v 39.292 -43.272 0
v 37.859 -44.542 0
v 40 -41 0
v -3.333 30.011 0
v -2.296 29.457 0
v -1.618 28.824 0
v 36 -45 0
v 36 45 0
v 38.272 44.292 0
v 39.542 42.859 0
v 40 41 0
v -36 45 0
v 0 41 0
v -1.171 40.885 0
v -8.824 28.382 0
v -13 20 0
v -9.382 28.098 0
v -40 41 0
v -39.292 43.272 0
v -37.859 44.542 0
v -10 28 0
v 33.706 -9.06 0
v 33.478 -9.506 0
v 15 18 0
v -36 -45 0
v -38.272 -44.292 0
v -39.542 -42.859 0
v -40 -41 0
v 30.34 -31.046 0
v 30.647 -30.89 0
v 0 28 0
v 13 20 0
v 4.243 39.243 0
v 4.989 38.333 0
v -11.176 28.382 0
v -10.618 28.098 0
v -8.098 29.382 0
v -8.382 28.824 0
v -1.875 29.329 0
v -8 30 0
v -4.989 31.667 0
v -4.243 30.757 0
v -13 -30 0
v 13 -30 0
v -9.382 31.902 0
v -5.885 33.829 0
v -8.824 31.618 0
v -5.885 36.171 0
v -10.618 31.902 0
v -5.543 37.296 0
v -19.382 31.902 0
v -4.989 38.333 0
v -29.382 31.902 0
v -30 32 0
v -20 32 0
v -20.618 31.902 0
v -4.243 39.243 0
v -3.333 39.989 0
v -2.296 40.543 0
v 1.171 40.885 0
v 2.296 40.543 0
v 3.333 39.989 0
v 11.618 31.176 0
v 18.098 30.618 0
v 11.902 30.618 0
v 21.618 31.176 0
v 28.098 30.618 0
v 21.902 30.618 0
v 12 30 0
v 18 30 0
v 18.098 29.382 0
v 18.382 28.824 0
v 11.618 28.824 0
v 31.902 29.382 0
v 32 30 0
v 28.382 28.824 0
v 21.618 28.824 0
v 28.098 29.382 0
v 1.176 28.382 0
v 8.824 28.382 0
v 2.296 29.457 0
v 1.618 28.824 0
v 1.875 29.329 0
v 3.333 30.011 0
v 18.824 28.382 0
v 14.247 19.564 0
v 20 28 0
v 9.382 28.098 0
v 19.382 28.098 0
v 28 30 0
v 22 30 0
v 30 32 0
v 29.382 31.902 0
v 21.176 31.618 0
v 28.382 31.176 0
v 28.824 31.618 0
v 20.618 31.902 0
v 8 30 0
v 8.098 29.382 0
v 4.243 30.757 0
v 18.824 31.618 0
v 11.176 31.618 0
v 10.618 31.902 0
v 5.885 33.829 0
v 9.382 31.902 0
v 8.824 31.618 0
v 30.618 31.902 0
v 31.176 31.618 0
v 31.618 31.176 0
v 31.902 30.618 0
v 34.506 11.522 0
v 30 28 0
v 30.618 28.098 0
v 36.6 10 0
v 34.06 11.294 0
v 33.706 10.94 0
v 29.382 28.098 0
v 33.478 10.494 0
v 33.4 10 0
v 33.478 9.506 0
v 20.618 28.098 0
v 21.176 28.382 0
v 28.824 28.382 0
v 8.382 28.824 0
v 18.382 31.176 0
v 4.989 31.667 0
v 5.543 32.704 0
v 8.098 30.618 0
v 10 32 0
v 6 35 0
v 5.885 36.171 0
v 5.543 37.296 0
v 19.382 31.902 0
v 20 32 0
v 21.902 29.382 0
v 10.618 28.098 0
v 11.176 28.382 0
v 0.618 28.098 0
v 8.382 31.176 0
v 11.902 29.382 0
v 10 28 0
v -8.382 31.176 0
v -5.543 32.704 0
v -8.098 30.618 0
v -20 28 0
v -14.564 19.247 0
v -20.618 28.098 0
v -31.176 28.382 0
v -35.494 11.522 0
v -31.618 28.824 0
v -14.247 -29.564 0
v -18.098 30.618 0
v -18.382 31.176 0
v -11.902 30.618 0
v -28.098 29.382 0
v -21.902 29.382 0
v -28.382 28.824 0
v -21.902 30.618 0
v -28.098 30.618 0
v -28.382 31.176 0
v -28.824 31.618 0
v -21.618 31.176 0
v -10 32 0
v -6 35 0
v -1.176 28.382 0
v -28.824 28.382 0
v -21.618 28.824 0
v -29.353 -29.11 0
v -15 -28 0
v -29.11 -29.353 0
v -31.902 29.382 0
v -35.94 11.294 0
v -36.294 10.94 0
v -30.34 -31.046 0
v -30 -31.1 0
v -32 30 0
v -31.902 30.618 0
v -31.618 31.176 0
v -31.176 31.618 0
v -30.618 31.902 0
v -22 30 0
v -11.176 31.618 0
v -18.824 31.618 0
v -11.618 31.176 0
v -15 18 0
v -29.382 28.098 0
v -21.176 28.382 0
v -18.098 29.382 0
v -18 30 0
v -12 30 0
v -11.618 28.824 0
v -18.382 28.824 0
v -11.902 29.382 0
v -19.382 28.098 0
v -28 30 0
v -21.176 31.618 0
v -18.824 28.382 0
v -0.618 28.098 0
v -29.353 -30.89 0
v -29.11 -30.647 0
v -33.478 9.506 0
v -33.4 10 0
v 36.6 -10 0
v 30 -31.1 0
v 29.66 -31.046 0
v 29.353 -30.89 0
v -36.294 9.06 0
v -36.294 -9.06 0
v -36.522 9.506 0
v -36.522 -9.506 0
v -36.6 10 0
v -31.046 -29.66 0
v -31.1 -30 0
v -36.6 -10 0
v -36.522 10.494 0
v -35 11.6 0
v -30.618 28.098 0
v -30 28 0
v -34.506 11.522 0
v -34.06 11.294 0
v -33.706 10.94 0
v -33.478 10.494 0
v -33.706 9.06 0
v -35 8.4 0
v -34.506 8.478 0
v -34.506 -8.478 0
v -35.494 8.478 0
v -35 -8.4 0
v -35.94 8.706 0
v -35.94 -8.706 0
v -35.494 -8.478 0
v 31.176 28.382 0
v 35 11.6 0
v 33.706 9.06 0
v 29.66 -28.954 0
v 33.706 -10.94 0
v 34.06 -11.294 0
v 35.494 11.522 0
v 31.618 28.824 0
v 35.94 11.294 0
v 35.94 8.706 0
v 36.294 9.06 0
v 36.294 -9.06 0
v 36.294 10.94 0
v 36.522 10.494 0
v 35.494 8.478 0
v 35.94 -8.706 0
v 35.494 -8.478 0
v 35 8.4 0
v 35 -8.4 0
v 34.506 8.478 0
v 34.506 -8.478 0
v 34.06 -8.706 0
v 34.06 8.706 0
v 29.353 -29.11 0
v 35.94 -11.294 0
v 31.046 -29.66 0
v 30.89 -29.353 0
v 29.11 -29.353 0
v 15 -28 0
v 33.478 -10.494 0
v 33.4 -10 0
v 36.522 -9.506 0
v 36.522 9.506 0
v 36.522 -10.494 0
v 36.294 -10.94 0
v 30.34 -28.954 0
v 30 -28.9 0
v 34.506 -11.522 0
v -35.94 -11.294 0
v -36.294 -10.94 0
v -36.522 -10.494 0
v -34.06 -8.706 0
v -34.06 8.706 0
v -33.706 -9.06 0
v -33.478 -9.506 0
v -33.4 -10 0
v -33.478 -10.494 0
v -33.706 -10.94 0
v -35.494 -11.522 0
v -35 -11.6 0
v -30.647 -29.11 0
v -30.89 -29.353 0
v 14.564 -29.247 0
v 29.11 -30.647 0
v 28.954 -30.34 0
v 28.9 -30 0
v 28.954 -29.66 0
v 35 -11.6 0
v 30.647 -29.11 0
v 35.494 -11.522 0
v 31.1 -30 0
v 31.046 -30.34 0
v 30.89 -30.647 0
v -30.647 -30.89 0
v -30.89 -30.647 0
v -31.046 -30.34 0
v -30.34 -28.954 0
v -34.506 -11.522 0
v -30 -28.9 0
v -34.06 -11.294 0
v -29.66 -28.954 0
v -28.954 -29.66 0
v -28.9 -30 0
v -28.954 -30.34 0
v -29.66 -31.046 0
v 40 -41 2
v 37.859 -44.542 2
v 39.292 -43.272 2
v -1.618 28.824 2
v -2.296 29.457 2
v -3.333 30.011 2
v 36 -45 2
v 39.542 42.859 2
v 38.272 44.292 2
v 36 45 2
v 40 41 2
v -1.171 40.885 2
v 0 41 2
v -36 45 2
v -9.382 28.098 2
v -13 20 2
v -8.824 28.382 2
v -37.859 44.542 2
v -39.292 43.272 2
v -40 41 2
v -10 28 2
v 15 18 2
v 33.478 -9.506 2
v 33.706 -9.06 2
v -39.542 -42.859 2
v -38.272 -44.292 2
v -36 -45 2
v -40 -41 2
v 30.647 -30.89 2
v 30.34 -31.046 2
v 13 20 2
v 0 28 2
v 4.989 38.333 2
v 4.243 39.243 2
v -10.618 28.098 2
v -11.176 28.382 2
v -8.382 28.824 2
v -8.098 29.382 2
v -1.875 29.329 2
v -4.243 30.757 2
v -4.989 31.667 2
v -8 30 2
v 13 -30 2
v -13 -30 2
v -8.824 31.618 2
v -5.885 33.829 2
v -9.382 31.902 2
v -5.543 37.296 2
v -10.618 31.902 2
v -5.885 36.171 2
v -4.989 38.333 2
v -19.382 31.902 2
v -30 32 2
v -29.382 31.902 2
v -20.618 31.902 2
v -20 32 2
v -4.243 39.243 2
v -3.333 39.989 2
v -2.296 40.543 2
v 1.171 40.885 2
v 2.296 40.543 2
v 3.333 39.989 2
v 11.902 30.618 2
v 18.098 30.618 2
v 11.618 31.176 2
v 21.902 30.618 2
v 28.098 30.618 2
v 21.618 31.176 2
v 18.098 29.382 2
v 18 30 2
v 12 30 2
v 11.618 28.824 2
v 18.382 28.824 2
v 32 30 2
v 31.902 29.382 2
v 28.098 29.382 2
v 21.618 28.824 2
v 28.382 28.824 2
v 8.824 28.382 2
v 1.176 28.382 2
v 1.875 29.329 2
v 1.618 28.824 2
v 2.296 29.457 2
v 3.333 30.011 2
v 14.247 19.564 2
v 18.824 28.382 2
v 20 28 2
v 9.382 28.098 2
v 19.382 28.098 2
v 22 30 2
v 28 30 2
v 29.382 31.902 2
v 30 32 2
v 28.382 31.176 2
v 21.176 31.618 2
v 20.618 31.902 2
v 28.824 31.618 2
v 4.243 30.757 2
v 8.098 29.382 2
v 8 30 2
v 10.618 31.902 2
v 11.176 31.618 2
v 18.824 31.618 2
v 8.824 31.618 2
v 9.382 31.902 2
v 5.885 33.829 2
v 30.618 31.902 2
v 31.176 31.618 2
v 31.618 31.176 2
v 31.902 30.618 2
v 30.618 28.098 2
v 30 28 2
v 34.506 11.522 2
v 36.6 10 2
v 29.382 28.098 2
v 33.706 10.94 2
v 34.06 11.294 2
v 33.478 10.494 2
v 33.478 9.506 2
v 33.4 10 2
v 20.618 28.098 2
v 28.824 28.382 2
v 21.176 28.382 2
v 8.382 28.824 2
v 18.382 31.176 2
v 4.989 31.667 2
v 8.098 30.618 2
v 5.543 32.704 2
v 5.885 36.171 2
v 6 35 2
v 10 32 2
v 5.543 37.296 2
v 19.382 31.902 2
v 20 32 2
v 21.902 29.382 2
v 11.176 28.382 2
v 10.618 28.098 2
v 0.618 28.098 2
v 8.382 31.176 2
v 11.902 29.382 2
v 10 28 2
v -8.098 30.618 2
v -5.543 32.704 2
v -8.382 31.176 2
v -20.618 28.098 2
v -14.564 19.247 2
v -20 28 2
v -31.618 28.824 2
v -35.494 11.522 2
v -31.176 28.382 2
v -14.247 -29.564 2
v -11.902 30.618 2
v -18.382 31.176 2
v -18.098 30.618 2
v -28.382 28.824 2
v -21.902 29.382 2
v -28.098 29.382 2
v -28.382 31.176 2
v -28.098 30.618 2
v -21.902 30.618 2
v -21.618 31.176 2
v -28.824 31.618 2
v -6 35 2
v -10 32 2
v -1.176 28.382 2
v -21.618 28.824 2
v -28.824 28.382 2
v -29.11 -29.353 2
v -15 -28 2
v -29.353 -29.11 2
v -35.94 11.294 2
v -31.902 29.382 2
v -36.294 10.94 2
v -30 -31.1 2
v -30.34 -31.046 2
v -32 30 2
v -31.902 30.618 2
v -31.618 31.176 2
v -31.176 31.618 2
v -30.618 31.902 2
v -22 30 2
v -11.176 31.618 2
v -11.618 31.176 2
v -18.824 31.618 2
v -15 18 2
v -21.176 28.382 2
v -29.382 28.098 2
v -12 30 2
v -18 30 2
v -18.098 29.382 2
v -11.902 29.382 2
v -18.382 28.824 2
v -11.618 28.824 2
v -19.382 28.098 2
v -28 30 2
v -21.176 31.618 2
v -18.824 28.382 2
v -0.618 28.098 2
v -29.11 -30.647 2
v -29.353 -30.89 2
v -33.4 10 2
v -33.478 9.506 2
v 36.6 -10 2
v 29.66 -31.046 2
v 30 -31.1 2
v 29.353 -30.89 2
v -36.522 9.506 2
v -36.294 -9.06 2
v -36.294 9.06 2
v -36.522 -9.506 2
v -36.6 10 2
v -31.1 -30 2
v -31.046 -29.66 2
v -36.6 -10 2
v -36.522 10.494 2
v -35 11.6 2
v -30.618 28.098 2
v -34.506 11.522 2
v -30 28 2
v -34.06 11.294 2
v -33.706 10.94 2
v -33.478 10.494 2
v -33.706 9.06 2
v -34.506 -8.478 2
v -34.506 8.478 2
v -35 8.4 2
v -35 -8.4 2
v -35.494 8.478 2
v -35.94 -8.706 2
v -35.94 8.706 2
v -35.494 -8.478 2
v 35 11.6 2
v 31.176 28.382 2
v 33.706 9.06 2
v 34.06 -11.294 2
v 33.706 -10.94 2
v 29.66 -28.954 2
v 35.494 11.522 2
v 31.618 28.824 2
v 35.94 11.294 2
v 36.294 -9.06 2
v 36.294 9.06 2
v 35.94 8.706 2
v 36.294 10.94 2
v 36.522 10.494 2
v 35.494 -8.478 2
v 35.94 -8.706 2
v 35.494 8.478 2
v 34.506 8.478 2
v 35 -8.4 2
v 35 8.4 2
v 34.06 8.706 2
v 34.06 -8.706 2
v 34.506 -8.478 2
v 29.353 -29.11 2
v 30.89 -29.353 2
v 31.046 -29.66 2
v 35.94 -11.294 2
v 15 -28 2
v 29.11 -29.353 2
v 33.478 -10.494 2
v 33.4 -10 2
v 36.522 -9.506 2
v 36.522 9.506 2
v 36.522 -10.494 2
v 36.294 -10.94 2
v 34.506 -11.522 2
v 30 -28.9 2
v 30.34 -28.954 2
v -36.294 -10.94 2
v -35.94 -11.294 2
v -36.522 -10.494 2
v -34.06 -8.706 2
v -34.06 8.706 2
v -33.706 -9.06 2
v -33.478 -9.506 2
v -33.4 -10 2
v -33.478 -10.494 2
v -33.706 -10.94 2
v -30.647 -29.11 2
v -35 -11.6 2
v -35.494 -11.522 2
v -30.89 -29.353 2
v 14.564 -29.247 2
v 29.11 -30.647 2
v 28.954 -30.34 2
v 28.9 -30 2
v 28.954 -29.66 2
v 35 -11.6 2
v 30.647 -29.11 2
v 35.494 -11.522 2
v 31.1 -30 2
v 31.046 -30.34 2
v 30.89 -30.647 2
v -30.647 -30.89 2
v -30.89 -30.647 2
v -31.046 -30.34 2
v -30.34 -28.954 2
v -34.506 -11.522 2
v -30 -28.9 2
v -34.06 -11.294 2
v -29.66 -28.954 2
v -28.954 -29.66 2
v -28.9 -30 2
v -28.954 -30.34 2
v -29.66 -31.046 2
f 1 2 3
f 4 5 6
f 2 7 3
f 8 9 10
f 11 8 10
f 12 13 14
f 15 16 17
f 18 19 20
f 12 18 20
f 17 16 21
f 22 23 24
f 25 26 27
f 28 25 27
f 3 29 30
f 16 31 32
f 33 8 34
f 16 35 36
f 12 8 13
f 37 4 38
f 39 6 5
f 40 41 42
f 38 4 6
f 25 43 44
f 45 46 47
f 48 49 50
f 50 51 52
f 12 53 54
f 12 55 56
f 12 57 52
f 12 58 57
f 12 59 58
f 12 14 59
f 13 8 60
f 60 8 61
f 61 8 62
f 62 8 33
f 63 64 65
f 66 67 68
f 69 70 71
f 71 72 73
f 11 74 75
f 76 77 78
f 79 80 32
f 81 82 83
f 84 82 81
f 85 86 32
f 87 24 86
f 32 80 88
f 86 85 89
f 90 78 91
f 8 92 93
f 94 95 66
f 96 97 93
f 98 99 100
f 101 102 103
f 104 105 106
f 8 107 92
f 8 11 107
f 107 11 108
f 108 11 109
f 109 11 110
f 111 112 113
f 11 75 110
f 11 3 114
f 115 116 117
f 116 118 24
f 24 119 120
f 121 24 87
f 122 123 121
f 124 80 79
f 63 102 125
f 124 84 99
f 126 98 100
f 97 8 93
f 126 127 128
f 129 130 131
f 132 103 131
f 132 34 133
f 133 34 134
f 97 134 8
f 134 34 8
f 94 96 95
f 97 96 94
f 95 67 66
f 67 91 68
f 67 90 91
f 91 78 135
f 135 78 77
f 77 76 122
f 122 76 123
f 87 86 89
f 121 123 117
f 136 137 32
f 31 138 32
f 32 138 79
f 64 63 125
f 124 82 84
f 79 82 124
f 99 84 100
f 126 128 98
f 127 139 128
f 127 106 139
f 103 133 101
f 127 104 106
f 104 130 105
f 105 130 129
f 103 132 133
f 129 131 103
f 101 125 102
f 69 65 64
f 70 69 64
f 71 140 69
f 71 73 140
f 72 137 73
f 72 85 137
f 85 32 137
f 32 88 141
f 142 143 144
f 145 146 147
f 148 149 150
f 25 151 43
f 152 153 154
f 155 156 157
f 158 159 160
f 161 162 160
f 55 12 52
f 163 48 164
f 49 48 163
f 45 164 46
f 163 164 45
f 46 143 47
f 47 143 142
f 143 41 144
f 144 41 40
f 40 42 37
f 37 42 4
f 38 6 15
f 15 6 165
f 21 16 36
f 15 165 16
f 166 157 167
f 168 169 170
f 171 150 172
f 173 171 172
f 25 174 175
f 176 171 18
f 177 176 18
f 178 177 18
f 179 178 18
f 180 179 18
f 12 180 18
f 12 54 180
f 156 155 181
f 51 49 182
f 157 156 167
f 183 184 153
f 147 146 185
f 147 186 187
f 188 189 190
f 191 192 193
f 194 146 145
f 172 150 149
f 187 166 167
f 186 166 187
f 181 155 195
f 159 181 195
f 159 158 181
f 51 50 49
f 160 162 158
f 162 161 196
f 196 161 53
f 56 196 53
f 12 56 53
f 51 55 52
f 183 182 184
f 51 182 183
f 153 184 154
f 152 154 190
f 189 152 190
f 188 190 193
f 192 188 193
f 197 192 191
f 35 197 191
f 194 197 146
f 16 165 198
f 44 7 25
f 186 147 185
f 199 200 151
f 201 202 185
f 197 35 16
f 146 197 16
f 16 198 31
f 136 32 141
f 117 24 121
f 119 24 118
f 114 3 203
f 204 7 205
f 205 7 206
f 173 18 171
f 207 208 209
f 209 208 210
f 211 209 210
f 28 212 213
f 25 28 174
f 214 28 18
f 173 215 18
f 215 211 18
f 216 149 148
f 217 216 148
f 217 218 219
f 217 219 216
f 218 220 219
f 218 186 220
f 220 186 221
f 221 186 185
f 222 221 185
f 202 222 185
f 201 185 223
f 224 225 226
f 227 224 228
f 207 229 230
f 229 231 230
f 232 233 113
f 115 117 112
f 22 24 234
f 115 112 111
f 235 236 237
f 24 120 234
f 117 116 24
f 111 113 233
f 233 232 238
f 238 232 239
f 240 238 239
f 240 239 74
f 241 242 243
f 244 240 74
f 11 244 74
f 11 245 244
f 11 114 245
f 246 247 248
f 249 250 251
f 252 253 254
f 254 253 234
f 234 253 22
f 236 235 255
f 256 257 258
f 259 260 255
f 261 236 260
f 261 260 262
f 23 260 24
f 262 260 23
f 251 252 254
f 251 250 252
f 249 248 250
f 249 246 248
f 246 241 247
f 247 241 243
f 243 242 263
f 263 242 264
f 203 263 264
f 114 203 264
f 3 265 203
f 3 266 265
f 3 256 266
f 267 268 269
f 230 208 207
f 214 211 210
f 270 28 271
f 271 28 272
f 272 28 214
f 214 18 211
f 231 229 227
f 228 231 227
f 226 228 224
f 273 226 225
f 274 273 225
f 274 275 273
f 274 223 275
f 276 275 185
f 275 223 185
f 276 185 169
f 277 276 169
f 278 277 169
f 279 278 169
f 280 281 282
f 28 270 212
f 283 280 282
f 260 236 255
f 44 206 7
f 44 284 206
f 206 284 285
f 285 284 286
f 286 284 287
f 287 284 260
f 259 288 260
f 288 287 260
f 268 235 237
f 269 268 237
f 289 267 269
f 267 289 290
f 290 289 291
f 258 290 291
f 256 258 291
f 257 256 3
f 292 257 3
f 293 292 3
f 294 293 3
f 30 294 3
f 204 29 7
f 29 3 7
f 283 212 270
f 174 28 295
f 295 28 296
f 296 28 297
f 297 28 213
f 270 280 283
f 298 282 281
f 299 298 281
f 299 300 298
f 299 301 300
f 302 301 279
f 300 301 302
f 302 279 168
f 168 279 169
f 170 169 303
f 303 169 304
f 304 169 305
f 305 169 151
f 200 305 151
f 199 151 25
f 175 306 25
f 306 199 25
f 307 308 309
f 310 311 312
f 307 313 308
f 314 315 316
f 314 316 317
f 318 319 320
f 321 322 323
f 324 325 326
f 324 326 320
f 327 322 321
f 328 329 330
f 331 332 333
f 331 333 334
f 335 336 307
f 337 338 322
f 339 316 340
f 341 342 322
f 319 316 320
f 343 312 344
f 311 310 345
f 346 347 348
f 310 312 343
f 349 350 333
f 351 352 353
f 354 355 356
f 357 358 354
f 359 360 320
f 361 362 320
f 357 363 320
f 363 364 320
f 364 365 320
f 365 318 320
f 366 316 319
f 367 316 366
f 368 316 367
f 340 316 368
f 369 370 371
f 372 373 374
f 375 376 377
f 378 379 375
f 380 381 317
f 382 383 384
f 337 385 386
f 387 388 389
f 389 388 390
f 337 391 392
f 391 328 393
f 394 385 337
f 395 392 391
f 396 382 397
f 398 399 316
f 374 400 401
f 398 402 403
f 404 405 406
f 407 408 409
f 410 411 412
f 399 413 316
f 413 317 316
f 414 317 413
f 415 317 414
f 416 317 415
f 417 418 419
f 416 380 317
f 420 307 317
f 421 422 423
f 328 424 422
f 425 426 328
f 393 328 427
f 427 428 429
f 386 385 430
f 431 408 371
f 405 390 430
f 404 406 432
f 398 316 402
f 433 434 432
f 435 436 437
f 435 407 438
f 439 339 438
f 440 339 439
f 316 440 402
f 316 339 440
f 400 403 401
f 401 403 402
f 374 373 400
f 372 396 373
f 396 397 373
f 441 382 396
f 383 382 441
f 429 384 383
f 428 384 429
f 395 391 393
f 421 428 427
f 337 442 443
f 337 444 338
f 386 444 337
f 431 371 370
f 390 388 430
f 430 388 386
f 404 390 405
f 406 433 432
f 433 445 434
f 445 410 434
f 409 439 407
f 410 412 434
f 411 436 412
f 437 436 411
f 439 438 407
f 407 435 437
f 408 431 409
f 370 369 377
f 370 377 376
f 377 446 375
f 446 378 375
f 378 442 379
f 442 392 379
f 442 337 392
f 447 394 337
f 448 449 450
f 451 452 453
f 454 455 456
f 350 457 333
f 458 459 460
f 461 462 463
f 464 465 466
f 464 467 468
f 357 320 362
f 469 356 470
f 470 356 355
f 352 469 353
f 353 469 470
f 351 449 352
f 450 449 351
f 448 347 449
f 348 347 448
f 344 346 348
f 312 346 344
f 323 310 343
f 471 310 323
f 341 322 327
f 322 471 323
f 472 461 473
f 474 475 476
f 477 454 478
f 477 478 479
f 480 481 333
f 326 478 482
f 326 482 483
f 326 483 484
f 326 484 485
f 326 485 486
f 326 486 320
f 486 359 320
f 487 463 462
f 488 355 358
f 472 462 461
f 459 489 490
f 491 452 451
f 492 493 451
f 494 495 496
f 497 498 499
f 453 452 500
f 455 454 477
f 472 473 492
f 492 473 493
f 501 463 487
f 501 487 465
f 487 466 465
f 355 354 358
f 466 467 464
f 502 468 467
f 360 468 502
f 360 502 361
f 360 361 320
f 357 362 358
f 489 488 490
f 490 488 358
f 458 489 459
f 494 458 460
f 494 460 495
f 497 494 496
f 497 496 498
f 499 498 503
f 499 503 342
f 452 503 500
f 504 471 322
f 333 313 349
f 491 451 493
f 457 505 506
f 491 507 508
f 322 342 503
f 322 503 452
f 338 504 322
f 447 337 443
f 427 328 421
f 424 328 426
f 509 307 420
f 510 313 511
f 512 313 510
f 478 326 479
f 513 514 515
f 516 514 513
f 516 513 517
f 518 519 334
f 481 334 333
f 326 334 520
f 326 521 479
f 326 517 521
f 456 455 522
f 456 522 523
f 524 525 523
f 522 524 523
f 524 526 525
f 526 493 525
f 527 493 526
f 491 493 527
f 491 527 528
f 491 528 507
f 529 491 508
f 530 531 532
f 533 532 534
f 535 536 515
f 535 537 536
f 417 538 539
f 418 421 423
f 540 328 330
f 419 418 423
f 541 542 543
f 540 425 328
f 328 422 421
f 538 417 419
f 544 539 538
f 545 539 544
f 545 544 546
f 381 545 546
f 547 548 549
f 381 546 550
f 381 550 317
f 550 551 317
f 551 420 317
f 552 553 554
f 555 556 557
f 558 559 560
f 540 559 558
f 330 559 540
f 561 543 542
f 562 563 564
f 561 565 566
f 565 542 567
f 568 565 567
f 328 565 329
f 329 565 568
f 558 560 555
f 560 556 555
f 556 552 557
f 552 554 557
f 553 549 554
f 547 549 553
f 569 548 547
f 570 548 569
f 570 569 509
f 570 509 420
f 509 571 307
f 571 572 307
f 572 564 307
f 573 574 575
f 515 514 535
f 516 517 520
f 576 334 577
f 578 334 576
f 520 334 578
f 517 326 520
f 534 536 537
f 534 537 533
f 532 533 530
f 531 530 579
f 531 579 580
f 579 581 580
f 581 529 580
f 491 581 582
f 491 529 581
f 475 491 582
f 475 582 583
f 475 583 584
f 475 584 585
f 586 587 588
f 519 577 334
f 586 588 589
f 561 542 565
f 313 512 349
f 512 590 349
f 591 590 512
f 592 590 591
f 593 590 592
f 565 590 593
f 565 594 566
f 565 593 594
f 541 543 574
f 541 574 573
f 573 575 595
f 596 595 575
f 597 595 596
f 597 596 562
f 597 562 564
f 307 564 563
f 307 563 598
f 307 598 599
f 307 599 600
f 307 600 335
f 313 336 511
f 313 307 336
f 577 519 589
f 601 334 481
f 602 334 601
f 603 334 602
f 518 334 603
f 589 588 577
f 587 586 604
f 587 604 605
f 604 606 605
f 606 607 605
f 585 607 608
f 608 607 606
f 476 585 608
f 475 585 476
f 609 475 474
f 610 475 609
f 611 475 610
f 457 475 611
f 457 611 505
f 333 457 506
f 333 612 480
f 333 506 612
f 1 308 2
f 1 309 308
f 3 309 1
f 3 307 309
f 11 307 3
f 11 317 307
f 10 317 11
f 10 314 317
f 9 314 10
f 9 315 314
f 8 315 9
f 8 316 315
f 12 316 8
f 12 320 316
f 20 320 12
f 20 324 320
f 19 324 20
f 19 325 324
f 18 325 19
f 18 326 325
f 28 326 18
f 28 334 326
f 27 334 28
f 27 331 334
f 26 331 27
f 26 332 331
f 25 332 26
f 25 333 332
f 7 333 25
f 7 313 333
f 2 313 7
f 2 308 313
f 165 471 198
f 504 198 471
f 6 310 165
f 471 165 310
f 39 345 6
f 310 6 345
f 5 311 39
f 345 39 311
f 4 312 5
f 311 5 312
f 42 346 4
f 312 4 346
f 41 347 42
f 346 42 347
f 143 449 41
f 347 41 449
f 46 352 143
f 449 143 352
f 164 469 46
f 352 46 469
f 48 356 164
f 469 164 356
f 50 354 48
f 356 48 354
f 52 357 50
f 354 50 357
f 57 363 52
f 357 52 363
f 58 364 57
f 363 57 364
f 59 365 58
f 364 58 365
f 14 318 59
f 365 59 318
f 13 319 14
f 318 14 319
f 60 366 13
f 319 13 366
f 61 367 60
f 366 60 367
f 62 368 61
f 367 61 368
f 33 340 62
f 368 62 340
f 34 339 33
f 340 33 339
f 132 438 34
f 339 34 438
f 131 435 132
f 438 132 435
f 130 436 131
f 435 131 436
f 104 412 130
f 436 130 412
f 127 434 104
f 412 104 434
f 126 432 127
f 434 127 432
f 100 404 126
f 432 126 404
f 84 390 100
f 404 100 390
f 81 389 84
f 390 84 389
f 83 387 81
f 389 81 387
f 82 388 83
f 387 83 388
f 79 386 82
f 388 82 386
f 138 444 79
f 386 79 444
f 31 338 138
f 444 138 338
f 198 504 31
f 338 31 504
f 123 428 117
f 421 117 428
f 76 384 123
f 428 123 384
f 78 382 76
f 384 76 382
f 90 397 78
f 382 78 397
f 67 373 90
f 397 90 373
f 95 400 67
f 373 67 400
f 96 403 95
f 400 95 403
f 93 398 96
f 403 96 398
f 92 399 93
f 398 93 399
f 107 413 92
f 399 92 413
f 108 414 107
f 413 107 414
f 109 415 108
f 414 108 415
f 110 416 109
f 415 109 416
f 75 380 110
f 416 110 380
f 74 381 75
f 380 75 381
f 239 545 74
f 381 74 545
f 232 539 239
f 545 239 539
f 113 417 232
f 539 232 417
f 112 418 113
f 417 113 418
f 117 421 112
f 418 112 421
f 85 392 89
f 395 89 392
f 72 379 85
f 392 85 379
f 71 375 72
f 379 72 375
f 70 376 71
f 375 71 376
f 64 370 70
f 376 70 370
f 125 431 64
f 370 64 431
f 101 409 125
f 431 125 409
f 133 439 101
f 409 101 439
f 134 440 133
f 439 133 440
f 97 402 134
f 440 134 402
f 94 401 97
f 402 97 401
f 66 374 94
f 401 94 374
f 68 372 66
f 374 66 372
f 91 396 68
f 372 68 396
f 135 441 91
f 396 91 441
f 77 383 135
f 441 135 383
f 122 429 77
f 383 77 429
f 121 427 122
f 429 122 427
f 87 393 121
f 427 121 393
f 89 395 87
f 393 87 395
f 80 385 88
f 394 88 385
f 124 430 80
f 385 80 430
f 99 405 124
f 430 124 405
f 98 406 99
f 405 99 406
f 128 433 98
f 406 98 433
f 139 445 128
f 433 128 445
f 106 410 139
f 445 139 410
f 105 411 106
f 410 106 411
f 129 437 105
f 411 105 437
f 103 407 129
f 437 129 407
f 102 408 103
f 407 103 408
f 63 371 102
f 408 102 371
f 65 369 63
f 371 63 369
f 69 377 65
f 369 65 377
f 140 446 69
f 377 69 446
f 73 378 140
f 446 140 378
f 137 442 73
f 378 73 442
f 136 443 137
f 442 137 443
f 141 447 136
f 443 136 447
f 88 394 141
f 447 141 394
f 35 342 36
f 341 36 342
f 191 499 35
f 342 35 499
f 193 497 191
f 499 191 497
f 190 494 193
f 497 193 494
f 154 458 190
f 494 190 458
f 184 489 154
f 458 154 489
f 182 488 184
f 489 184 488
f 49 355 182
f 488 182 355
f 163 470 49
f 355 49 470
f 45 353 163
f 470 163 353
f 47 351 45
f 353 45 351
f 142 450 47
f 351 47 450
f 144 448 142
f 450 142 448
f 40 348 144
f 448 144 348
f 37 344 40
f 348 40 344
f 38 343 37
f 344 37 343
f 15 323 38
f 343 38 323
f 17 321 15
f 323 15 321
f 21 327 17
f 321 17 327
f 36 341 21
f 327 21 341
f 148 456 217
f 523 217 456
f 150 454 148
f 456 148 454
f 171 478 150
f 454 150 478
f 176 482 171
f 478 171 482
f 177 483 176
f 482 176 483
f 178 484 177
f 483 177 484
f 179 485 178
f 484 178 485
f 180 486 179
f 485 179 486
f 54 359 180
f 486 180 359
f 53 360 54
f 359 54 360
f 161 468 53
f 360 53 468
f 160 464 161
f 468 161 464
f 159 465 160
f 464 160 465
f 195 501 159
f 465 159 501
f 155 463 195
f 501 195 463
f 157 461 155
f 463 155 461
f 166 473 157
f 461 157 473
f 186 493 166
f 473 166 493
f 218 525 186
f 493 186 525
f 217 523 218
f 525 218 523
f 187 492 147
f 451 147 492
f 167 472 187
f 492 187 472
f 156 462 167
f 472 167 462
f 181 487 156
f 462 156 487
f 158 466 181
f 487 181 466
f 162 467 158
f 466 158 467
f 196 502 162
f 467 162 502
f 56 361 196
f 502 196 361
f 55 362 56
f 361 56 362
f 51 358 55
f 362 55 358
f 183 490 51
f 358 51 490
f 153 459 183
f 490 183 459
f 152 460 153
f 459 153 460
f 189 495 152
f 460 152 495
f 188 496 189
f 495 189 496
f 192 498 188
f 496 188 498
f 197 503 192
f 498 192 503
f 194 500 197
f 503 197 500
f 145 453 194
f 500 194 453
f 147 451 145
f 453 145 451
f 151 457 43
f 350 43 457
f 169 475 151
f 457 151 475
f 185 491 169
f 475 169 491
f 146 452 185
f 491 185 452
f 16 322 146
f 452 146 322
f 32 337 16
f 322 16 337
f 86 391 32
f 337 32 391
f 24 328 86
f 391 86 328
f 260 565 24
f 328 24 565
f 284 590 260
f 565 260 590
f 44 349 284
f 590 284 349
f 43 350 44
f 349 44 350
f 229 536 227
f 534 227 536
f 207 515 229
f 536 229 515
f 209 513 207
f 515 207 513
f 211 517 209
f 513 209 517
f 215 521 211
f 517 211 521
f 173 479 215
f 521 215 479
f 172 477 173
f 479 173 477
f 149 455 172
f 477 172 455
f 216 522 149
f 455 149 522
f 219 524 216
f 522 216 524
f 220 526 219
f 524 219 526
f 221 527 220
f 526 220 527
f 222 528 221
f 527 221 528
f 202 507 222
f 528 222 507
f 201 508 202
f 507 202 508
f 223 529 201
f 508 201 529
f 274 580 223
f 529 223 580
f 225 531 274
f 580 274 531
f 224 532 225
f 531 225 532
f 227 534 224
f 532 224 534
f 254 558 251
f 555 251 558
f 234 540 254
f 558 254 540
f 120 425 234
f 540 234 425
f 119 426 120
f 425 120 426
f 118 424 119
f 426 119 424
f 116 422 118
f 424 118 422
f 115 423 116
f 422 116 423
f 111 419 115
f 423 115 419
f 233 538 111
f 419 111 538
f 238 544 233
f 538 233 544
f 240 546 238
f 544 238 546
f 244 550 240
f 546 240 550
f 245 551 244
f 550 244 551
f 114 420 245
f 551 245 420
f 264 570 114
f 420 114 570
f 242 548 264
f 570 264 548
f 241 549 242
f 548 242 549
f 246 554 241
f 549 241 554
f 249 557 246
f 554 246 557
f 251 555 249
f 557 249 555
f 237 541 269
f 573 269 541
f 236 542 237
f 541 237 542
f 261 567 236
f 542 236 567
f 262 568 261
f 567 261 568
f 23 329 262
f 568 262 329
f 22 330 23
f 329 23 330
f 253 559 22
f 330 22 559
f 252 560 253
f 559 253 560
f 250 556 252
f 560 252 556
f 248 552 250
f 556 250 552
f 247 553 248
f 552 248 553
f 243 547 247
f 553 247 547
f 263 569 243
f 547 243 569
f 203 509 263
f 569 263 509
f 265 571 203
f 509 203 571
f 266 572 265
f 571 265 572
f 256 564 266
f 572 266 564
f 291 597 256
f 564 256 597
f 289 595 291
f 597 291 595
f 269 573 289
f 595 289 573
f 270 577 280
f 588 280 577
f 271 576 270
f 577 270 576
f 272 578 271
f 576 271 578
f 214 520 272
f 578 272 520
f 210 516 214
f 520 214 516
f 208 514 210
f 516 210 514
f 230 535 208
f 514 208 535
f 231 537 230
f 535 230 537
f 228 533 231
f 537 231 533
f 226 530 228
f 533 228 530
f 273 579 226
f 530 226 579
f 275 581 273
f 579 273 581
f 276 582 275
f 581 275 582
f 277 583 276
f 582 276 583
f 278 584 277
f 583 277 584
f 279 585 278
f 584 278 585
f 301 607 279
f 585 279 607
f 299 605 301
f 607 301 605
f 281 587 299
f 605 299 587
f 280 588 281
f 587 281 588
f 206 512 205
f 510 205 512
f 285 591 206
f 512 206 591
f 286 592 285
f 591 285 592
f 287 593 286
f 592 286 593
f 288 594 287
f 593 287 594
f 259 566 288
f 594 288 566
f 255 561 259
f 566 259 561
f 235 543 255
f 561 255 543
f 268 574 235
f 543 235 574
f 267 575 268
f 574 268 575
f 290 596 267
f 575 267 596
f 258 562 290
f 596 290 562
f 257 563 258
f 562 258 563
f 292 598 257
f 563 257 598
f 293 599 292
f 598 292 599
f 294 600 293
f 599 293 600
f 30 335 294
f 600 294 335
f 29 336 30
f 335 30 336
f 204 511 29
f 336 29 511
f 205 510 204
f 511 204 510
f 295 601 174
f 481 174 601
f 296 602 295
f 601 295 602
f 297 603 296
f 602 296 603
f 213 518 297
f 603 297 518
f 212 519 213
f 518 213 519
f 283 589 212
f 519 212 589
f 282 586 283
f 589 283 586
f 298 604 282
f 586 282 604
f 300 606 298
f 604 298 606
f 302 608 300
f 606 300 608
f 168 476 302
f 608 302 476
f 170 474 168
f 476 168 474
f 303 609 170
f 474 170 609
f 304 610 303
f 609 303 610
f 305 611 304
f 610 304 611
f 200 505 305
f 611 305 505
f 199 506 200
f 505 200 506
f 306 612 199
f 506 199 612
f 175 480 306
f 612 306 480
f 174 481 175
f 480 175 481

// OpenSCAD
// =====================================================
// PLACA BASE DEL CHASIS — IITA WRO Bot v1
// Para corte láser en aluminio 2mm o impresión 3D
// =====================================================
// Dimensiones: 80×90mm
// Material: Aluminio 6061 T6 de 2mm (corte láser)
//           o PLA+ 3mm (impresión 3D)
// =====================================================

// === DIMENSIONES GENERALES ===
chasis_ancho = 80;        // mm
chasis_largo = 90;        // mm
chasis_espesor = 2;       // mm (aluminio) o 3mm (PLA)
chasis_radio = 4;         // mm, radio de esquinas

// === POSICIONES DE MONTAJE ===

// Motores Pololu N20 (brackets)
motor_y = 45;             // mm desde borde frontal
motor_x_offset = 35;     // mm desde centro (cada lado)
motor_mount_d = 3.2;     // mm (inserto M2)
motor_mount_sep = 20;    // mm entre agujeros del bracket

// PCB inferior (Teensy) — 4 standoffs
pcb_mount_d = 2.2;       // mm (tornillo M2)
pcb_mount_x = 30;        // mm desde centro
pcb_mount_y_front = 15;  // mm desde borde frontal
pcb_mount_y_back = 75;   // mm desde borde frontal

// Ball caster trasero
caster_y = 80;            // mm desde borde frontal
caster_d = 12;            // mm, agujero para ball caster

// Dynamixel brazo (lateral)
dxl_brazo_x = -chasis_ancho/2 + 5;  // borde izquierdo
dxl_brazo_y = 35;
dxl_mount_d = 2.7;       // mm (M2.5)
dxl_mount_sep = 18;      // mm

// Batería LiPo (ventana central para bajar CG)
batt_ancho = 30;          // mm
batt_largo = 50;          // mm
batt_y = 40;              // mm desde borde frontal

// Sensor array color (agujeros para sensores VEML6040)
sensor_count = 7;
sensor_spacing = 10;      // mm entre sensores
sensor_d = 4;             // mm, agujero para sensor
sensor_y = 75;            // mm desde borde frontal

// === MÓDULO PLACA BASE ===
module placa_base_2d() {
    // Versión 2D para exportar DXF (corte láser)
    difference() {
        // Contorno con esquinas redondeadas
        offset(r=chasis_radio) 
            offset(r=-chasis_radio)
                square([chasis_ancho, chasis_largo], center=true);
        
        // Agujeros montaje motores (izq y der)
        for (lado = [-1, 1])
            for (dy = [-motor_mount_sep/2, motor_mount_sep/2])
                translate([lado * motor_x_offset, motor_y - chasis_largo/2 + dy])
                    circle(d=motor_mount_d, $fn=20);
        
        // Agujeros montaje PCB (4 esquinas)
        for (dx = [-pcb_mount_x, pcb_mount_x])
            for (dy = [pcb_mount_y_front, pcb_mount_y_back])
                translate([dx, dy - chasis_largo/2])
                    circle(d=pcb_mount_d, $fn=20);
        
        // Agujero ball caster
        translate([0, caster_y - chasis_largo/2])
            circle(d=caster_d, $fn=32);
        
        // Ventana batería (reduce peso + acceso batería)
        translate([-batt_ancho/2, batt_y - chasis_largo/2 - batt_largo/2])
            offset(r=2) offset(r=-2)
                square([batt_ancho, batt_largo]);
        
        // Agujeros sensores color array
        for (i = [0:sensor_count-1])
            translate([i * sensor_spacing - (sensor_count-1) * sensor_spacing/2,
                       sensor_y - chasis_largo/2])
                circle(d=sensor_d, $fn=20);
        
        // Agujeros montaje Dynamixel brazo (izquierda)
        for (dy = [-dxl_mount_sep/2, dxl_mount_sep/2])
            translate([dxl_brazo_x + chasis_ancho/2, 
                       dxl_brazo_y - chasis_largo/2 + dy])
                circle(d=dxl_mount_d, $fn=20);
    }
}

module placa_base_3d() {
    // Versión 3D (para visualización o impresión)
    linear_extrude(height=chasis_espesor)
        placa_base_2d();
}

// === RENDER ===
// Para corte láser: exportar como DXF
// projection() placa_base_2d();  // Descomentar y exportar DXF

// Para visualización 3D:
placa_base_3d();

// Para exportar DXF para corte láser:
// 1. Descomentar la línea projection()
// 2. En OpenSCAD: Design → Export as DXF
// 3. Enviar el .dxf al servicio de corte láser
